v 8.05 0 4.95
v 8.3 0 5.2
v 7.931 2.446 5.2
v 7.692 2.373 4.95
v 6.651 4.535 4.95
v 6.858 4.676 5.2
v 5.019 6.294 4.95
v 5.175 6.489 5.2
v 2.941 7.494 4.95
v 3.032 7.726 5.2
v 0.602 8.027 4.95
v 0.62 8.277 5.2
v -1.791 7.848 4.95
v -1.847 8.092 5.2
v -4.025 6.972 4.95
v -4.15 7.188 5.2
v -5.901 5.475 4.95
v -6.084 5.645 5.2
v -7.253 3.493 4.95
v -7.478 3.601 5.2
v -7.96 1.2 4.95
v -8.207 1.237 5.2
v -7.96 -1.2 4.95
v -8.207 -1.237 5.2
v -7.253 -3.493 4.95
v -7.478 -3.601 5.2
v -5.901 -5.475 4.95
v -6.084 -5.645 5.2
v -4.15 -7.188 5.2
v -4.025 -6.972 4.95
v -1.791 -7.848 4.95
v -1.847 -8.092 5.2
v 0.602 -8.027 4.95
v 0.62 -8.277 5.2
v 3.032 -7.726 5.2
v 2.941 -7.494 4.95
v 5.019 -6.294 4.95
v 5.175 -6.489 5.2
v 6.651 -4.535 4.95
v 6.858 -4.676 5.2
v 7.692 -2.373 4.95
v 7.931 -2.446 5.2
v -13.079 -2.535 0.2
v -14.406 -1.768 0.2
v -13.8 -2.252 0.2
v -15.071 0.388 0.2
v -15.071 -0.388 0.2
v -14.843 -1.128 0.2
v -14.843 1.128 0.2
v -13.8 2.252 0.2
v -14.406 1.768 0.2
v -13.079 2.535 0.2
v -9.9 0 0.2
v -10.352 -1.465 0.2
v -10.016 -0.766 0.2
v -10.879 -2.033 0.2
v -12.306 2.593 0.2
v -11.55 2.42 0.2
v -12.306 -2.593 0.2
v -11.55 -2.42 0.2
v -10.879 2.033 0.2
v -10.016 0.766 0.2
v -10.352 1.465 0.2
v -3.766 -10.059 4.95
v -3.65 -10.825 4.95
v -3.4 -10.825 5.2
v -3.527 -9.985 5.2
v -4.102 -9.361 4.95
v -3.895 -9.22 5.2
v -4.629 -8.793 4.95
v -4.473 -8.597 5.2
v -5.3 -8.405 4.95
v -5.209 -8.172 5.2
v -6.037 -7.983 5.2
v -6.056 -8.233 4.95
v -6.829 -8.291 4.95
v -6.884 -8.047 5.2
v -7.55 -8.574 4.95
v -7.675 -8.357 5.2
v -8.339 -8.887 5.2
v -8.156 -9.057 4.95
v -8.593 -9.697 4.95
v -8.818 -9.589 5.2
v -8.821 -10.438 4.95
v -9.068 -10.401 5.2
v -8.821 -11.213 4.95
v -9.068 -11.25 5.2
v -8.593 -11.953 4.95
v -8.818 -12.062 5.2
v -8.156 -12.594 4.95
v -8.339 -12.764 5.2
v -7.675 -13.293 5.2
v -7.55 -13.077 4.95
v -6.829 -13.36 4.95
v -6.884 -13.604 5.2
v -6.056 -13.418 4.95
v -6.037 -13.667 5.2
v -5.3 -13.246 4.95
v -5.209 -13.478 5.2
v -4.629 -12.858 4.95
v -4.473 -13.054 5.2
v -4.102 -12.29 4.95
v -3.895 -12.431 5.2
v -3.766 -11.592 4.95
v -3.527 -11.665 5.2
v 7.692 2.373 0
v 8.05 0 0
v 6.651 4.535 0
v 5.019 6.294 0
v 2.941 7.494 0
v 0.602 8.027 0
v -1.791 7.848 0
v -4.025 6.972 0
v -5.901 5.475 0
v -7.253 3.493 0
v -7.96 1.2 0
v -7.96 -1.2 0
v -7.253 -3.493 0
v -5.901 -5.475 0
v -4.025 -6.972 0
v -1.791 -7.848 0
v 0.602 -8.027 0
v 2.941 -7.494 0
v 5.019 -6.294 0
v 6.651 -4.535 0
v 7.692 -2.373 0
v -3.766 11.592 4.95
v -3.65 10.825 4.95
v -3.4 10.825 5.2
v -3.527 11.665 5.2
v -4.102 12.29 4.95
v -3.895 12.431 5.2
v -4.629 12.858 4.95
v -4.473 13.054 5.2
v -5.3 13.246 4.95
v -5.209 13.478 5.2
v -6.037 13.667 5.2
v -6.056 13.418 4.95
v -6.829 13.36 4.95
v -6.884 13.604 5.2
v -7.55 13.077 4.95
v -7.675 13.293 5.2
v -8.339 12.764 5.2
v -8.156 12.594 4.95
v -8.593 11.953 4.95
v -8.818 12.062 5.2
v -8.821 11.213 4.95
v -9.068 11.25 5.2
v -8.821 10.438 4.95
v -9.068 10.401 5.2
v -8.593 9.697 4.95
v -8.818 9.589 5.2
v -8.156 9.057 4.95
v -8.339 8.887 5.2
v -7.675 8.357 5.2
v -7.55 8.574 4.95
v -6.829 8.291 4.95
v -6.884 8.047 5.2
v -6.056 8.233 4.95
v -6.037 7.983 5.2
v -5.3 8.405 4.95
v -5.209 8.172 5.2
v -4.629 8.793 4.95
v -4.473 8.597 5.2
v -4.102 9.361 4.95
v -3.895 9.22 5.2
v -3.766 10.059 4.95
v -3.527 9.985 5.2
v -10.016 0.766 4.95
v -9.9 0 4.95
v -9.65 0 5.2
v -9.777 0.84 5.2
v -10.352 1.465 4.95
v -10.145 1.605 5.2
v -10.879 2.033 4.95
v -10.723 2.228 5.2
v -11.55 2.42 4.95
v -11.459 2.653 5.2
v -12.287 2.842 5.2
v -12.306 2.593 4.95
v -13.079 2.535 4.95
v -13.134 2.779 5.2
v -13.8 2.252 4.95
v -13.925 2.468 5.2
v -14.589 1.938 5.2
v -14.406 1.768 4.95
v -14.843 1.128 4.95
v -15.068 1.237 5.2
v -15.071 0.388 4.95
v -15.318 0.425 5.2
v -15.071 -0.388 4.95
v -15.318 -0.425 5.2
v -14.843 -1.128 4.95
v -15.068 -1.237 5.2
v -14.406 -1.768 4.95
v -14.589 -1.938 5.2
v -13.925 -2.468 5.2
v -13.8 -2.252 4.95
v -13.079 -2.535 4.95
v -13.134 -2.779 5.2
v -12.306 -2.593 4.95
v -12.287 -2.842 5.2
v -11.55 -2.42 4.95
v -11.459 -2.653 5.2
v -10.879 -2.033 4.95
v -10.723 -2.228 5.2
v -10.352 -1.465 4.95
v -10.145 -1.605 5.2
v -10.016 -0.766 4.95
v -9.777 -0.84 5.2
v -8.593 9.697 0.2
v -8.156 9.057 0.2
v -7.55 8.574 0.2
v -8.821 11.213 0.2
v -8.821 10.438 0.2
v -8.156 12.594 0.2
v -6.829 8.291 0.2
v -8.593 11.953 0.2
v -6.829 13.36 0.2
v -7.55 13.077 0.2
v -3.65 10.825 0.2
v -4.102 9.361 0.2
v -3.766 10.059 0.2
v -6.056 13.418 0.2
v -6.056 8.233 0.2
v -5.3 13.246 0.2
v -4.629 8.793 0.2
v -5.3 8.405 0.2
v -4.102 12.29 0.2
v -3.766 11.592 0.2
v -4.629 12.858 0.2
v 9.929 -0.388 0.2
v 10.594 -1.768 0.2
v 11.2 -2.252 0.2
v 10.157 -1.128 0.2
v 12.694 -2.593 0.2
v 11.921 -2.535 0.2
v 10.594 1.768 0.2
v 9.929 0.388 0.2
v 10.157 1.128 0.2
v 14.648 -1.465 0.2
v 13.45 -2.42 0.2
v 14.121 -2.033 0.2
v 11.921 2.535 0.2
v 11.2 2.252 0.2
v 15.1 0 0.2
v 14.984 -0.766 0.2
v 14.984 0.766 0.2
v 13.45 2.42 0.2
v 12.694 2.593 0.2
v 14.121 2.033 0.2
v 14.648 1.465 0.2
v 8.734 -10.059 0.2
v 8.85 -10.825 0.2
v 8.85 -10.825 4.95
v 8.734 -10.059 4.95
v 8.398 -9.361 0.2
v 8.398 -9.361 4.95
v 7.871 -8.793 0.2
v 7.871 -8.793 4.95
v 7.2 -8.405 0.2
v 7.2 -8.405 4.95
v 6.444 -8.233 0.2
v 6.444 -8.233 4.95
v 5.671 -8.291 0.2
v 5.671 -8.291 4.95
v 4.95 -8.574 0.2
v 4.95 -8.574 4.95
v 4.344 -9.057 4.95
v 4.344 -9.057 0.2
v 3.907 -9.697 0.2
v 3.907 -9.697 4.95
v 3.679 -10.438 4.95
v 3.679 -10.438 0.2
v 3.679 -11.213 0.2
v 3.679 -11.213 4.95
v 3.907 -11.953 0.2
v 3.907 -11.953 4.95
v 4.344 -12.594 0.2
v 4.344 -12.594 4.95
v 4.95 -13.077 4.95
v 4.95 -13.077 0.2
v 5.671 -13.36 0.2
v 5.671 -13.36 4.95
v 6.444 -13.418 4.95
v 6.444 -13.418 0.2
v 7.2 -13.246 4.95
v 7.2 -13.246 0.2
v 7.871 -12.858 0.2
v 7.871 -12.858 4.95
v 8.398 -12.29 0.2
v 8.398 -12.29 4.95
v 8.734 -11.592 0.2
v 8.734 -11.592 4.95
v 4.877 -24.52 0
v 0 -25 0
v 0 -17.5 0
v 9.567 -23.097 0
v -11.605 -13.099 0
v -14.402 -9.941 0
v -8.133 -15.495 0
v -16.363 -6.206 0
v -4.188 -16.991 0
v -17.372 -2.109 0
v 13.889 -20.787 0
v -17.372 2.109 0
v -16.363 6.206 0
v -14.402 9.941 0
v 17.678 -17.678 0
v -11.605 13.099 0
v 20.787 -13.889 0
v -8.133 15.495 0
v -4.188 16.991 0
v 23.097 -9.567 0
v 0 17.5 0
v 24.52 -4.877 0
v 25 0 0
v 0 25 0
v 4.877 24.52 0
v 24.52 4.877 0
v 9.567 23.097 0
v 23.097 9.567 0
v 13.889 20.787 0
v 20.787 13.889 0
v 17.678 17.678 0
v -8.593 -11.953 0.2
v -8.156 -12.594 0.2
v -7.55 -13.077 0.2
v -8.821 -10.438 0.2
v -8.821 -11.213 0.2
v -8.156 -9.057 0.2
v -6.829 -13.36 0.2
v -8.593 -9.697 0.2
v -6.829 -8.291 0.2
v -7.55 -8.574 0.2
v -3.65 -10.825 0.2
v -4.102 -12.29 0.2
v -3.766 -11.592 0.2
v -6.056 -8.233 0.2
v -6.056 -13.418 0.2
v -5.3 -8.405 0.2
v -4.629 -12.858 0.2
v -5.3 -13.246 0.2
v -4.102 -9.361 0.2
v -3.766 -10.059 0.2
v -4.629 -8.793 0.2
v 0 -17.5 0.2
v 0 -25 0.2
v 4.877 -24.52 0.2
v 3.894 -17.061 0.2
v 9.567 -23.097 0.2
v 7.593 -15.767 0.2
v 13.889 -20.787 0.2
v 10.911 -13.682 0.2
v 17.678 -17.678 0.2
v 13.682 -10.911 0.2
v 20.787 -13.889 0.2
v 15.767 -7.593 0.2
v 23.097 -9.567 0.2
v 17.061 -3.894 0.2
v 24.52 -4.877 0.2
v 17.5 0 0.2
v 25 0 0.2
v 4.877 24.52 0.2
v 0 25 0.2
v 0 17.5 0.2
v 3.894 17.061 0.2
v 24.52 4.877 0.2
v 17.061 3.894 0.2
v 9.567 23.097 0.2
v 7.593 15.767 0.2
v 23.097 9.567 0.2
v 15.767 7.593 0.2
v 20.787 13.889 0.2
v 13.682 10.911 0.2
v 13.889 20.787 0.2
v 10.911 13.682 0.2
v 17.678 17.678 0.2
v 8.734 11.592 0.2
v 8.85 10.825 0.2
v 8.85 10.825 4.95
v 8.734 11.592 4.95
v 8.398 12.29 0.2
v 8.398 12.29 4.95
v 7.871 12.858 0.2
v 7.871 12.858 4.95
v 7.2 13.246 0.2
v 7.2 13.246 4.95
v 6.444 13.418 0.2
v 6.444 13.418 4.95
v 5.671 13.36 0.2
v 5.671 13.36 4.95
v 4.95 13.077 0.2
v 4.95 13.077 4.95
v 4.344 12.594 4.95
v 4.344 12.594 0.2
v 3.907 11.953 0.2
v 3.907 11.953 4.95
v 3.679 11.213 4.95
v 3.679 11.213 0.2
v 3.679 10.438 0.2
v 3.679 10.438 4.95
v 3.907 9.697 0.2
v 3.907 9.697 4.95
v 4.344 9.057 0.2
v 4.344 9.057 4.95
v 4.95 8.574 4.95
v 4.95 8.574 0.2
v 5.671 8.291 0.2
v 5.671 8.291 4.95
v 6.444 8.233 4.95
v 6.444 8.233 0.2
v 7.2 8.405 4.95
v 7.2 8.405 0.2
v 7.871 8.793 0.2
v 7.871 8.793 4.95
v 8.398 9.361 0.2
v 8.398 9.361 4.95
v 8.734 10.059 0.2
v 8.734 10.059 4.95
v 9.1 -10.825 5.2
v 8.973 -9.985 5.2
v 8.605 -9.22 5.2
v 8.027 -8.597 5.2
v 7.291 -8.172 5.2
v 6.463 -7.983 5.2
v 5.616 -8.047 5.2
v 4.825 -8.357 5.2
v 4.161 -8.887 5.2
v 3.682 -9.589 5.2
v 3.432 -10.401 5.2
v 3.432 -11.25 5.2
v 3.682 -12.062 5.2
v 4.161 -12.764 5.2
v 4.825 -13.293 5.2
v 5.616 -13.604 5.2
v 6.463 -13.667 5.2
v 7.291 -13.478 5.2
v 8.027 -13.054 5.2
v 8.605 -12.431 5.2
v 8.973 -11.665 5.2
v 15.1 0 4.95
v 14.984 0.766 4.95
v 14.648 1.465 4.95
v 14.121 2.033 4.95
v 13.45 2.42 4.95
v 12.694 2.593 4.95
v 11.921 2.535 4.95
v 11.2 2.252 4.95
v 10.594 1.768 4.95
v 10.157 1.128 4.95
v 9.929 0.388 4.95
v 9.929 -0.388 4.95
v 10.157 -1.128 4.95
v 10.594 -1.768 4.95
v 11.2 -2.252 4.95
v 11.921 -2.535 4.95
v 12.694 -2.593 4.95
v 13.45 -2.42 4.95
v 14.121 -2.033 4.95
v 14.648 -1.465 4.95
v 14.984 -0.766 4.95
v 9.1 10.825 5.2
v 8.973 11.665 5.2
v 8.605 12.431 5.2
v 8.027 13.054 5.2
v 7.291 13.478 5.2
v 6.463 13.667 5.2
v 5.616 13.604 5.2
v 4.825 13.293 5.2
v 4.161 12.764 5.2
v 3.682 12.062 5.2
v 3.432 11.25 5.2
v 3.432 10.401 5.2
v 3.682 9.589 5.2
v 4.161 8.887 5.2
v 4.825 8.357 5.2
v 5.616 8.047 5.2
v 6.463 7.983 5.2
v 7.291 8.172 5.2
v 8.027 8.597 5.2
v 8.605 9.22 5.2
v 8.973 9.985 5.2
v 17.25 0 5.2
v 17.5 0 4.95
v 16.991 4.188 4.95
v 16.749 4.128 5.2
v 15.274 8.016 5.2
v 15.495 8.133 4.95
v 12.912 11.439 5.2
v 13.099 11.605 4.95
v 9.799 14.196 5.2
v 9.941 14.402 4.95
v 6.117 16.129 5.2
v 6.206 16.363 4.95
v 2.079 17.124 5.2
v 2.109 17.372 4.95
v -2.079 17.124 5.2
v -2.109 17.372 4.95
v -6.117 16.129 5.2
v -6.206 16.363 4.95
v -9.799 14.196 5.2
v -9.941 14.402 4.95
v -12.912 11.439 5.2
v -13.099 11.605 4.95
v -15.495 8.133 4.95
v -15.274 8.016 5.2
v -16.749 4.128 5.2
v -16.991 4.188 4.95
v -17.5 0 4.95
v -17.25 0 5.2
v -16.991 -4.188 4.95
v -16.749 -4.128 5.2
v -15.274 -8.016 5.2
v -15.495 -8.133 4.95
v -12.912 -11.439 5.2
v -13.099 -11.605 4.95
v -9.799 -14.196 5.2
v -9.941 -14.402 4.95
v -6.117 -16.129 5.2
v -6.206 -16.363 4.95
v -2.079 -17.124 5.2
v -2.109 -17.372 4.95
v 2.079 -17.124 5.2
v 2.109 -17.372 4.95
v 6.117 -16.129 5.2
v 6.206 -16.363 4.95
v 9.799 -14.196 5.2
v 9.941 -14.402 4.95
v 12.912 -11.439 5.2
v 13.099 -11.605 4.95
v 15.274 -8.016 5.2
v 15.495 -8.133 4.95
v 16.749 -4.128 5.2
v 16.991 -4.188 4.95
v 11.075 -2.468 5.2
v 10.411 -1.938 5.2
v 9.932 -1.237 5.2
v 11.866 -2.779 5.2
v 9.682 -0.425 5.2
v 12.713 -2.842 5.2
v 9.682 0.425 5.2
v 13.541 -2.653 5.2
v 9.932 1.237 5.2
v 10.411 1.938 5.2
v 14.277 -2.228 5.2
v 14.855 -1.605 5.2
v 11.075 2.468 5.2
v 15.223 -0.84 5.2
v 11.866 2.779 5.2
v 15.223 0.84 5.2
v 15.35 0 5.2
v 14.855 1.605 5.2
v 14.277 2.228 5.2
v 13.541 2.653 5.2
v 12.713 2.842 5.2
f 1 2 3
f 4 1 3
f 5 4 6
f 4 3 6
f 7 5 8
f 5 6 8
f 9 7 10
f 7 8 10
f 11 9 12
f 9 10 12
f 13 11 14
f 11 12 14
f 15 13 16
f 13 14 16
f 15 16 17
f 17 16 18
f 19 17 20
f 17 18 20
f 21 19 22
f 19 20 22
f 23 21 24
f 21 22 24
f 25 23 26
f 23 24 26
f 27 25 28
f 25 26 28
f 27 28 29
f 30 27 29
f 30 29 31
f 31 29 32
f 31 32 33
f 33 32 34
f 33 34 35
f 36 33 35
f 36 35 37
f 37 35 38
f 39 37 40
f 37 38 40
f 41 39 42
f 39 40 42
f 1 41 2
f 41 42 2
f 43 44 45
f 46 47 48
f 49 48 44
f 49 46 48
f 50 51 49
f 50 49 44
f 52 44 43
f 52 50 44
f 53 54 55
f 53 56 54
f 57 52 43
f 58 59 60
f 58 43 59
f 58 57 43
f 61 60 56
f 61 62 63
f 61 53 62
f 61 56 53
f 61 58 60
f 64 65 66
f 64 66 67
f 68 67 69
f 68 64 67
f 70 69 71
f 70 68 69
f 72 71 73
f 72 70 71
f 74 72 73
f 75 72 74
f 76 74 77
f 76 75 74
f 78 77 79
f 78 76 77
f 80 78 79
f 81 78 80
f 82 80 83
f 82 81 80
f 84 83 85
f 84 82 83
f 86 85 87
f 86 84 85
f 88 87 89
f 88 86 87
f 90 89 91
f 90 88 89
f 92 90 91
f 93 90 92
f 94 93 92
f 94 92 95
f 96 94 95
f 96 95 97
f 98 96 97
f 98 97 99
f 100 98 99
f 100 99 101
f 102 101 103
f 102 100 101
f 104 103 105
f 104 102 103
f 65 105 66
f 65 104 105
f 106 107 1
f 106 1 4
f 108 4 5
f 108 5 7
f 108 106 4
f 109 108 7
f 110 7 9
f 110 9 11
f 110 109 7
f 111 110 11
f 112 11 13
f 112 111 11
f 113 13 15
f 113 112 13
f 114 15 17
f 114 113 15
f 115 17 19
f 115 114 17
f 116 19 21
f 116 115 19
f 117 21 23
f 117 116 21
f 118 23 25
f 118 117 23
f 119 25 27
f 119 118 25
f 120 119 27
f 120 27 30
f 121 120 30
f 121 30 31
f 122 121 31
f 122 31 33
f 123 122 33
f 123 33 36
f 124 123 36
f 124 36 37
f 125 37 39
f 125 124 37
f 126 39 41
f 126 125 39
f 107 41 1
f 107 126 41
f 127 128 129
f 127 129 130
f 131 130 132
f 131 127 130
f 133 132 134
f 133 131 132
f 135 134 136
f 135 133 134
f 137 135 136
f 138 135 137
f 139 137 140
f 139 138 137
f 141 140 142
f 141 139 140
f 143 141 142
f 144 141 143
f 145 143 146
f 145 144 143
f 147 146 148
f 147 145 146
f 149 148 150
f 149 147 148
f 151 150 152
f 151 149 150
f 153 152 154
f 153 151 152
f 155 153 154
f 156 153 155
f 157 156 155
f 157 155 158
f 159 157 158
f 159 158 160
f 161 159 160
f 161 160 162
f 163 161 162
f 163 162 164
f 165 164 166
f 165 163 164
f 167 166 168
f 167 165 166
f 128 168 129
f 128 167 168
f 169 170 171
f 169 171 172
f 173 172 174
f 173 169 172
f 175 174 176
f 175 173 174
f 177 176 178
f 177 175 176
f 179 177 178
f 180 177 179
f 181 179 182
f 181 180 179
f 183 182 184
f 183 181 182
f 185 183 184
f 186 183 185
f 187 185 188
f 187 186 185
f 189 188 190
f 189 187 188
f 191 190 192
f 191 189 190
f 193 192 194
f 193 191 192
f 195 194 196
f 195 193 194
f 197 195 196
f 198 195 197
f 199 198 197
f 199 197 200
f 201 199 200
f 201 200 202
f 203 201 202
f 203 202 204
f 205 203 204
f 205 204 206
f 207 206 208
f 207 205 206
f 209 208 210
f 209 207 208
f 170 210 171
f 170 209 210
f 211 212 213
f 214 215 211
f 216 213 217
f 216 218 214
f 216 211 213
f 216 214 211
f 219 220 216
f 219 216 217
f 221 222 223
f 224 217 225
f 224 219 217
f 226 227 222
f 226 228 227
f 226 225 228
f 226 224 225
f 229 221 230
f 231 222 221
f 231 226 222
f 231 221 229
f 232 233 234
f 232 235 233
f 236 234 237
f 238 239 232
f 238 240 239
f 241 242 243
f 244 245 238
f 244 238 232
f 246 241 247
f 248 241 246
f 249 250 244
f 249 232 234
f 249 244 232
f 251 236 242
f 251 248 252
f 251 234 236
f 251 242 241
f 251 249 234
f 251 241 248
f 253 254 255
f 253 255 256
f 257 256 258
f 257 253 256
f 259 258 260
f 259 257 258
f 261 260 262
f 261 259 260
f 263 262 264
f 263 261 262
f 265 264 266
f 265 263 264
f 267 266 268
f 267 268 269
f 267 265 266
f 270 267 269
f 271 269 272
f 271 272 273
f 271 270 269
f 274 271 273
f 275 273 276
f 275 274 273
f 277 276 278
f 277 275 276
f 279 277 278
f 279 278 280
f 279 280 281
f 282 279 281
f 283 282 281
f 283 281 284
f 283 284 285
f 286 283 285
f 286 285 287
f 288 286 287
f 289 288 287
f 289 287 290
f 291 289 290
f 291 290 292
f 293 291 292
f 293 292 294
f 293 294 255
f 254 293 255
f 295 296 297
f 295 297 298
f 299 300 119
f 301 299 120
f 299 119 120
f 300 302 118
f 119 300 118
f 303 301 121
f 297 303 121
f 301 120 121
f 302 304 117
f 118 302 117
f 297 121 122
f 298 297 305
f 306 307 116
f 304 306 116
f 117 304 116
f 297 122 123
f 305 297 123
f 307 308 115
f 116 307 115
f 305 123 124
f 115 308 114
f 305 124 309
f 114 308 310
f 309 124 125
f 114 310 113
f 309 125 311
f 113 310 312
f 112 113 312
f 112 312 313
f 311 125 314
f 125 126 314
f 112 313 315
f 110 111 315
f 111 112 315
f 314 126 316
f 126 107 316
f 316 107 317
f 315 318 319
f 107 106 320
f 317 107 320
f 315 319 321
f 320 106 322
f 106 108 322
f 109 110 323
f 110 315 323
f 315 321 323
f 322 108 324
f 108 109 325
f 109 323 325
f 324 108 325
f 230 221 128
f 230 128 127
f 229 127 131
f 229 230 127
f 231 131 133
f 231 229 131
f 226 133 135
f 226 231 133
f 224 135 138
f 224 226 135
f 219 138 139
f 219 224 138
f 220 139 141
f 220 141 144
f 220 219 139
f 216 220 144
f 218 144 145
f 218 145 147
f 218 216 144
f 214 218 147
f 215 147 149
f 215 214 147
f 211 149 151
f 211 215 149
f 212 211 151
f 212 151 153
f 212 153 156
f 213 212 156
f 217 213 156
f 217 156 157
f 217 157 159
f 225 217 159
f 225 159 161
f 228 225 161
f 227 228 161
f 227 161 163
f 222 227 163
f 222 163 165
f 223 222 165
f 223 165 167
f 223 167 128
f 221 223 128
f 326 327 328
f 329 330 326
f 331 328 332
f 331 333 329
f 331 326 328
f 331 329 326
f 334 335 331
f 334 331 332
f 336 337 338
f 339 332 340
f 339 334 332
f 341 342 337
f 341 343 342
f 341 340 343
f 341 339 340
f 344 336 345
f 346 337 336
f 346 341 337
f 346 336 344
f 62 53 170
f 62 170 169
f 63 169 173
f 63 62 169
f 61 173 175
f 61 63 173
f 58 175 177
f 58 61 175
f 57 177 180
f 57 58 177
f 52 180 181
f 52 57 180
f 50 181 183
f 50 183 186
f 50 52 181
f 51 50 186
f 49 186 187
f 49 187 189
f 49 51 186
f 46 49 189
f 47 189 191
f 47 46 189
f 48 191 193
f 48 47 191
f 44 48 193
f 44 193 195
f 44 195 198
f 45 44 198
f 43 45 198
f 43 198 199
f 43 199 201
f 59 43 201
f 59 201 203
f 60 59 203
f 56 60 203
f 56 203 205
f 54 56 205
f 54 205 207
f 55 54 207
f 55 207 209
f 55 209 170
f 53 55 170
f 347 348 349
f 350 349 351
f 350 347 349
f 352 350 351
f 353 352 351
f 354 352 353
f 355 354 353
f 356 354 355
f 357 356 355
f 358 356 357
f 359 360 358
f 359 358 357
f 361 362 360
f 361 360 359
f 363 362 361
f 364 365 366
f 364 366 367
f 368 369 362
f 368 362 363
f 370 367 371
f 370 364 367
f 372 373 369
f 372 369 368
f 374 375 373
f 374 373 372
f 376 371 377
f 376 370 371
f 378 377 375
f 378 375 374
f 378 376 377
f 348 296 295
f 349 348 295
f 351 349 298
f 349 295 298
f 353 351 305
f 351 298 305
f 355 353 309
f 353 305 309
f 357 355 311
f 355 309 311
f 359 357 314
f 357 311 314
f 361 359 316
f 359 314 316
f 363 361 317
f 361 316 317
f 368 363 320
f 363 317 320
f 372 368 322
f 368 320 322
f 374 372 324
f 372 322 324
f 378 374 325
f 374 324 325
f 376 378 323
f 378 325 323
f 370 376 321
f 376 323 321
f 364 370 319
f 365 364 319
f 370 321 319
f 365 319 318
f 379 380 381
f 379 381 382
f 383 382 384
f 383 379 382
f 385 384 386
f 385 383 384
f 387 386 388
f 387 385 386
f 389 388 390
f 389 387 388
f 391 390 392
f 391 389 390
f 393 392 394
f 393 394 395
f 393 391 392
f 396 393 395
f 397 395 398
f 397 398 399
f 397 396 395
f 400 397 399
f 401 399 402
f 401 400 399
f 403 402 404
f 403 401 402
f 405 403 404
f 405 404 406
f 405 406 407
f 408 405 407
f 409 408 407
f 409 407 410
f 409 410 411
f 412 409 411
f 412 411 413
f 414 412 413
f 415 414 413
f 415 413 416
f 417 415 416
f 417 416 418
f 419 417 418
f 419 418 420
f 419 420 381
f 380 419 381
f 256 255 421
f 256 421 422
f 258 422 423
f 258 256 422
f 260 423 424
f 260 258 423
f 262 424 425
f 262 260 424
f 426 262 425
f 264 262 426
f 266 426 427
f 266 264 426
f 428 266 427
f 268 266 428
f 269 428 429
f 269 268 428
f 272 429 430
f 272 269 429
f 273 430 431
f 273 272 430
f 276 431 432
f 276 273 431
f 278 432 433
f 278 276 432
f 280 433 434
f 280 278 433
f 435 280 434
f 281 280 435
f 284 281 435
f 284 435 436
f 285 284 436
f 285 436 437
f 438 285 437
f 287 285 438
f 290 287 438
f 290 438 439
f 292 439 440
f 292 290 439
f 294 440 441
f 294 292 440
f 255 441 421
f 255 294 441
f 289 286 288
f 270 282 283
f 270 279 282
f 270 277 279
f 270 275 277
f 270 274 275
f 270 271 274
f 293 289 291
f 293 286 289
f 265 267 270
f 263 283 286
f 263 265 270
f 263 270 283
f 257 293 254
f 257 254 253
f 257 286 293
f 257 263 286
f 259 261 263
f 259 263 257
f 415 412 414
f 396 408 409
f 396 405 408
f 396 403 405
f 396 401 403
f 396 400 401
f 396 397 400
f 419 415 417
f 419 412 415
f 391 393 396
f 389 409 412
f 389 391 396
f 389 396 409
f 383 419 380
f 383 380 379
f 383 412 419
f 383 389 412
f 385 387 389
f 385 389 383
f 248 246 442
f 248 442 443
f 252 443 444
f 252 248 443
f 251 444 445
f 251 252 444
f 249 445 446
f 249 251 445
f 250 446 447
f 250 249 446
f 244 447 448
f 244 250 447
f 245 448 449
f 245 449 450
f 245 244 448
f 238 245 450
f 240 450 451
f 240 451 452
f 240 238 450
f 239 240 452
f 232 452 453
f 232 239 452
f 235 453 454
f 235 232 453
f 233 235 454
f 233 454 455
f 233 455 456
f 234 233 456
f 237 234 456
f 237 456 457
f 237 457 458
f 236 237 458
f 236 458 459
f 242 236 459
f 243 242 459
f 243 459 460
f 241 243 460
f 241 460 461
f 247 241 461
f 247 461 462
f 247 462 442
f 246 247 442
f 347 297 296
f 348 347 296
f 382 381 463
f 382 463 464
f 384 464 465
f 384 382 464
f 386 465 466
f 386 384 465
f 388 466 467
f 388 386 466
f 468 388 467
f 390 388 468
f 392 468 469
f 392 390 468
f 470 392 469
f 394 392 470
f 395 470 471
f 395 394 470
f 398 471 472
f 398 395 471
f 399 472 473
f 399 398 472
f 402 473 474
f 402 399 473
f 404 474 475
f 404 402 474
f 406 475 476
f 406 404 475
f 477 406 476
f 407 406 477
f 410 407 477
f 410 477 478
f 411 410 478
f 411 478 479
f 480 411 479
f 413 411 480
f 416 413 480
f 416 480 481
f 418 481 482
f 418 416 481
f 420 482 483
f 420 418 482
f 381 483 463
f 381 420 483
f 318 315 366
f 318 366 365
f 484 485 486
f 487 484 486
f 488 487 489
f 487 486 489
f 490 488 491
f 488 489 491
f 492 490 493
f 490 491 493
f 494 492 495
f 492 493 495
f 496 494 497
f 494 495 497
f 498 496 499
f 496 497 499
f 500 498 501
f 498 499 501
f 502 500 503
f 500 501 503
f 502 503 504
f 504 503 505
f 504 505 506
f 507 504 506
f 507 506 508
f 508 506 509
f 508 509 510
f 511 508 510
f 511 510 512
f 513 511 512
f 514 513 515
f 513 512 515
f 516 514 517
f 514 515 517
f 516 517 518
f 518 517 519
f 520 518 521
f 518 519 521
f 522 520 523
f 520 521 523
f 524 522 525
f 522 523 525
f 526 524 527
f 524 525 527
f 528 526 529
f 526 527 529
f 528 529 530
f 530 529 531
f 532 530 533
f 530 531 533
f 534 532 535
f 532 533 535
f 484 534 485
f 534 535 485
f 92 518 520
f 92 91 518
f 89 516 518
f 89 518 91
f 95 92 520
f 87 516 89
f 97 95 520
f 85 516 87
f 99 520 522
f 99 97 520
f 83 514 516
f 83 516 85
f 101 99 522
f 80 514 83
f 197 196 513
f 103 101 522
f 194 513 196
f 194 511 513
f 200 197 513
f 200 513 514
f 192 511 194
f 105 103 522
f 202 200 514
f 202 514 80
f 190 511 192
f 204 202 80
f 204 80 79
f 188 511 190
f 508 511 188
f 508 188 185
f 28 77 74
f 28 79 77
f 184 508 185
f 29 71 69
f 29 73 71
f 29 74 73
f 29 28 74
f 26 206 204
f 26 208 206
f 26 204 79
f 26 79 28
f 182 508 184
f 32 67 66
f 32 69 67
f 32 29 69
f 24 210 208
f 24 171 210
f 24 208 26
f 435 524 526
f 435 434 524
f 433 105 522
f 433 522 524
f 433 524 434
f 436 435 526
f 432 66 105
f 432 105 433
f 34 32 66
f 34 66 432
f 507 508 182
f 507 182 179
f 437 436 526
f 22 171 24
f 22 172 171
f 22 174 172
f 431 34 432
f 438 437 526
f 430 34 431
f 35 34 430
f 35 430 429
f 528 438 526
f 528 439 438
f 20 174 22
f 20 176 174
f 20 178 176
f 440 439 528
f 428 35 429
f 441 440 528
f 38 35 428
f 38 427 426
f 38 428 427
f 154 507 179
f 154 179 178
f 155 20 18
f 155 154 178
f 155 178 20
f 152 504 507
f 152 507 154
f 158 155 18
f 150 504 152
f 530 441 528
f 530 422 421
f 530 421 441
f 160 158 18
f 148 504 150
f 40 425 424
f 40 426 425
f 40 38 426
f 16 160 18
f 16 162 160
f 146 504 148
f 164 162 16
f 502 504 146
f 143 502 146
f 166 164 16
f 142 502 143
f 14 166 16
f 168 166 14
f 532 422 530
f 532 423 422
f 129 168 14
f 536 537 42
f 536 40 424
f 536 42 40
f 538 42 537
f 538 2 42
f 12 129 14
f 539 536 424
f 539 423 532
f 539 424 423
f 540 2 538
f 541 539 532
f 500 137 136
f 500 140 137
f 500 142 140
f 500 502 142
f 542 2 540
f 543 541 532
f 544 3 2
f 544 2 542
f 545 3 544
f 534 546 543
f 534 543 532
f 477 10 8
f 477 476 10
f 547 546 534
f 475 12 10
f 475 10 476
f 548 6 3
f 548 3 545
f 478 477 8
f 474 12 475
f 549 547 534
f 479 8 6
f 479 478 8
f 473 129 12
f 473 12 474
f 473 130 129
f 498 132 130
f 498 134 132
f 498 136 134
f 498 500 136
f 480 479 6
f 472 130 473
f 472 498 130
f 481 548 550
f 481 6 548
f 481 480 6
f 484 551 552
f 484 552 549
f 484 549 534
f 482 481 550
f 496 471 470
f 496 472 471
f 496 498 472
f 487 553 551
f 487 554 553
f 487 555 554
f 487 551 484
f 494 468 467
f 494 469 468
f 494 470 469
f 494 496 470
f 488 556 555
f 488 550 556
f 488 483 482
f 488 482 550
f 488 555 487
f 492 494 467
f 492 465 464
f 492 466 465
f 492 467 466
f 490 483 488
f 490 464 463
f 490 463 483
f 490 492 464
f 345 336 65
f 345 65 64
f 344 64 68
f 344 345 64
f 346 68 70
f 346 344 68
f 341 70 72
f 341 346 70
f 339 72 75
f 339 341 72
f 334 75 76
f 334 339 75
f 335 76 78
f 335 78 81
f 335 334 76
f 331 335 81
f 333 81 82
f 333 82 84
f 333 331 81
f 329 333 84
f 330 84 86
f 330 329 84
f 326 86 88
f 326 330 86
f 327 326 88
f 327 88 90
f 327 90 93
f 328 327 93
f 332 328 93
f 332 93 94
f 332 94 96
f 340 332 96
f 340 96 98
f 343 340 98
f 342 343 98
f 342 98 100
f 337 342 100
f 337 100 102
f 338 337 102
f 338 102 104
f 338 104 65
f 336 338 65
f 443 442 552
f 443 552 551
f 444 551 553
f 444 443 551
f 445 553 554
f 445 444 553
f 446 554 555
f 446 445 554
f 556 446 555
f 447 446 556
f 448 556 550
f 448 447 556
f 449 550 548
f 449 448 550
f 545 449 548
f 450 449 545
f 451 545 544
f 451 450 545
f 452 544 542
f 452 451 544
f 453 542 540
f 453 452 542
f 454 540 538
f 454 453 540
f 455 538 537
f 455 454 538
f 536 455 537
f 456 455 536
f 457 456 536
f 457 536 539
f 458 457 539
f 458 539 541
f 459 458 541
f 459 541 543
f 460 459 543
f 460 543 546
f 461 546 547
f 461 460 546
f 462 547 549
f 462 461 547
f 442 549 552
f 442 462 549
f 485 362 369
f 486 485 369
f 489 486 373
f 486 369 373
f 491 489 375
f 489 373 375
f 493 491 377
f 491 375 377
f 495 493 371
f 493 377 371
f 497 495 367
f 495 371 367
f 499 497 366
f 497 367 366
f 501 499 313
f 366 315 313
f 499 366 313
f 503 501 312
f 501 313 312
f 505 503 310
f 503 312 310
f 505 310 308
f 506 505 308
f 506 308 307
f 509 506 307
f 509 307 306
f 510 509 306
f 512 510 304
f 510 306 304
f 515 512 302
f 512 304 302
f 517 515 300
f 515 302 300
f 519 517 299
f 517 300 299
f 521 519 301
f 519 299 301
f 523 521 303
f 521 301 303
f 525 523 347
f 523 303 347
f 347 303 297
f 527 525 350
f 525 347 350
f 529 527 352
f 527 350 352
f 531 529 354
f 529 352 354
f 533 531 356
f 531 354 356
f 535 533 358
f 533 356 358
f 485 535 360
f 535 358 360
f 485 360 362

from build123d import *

# Parameters (mm, degrees)
SKETCH_R        = 17.5
SKETCH_R_2      = 8.05
SKETCH_R_3      = 2.6
PAD_DEPTH       = 5.2
SKETCH001_R     = 8.05
PAD001_DEPTH    = 0.2
CHAMFER001_SIZE = 0.25


with BuildPart() as part:
    # Sketch → Pad (new body)
    with BuildSketch(Plane.XY):
        Circle(SKETCH_R)
        Circle(SKETCH_R_2, mode=Mode.SUBTRACT)
        with Locations((12.5, 0)):
            Circle(SKETCH_R_3, mode=Mode.SUBTRACT)
        with Locations((-12.5, 0)):
            Circle(SKETCH_R_3, mode=Mode.SUBTRACT)
        with Locations((-6.25, 10.825318)):
            Circle(SKETCH_R_3, mode=Mode.SUBTRACT)
        with Locations((6.25, 10.825318)):
            Circle(SKETCH_R_3, mode=Mode.SUBTRACT)
        with Locations((-6.25, -10.825318)):
            Circle(SKETCH_R_3, mode=Mode.SUBTRACT)
        with Locations((6.25, -10.825318)):
            Circle(SKETCH_R_3, mode=Mode.SUBTRACT)
    extrude(amount=PAD_DEPTH)

    # Sketch001 → Pad001 (join)
    with BuildSketch(Plane.XY):
        with BuildLine():
            ThreePointArc((0, 17.5), (-17.5, 0), (0, -17.5))
            Line((0, -17.5), (0, -25))
            ThreePointArc((0, -25), (25, 0), (0, 25))
            Line((0, 17.5), (0, 25))
        make_face()
        Circle(SKETCH001_R, mode=Mode.SUBTRACT)
    extrude(amount=PAD001_DEPTH)

    # Chamfer001
    chamfer001_edges = [part.edges().sort_by_distance(p)[0] for p in [
        (-17.5, 0, 5.2),
        (-8.05, 0, 5.2),
        (3.65, -10.825318, 5.2),
        (-8.85, 10.825318, 5.2),
        (-15.1, 0, 5.2),
        (9.9, 0, 5.2),
        (-8.85, -10.825318, 5.2),
        (3.65, 10.825318, 5.2),
    ]]
    chamfer(chamfer001_edges, length=CHAMFER001_SIZE)


solid = part.part
